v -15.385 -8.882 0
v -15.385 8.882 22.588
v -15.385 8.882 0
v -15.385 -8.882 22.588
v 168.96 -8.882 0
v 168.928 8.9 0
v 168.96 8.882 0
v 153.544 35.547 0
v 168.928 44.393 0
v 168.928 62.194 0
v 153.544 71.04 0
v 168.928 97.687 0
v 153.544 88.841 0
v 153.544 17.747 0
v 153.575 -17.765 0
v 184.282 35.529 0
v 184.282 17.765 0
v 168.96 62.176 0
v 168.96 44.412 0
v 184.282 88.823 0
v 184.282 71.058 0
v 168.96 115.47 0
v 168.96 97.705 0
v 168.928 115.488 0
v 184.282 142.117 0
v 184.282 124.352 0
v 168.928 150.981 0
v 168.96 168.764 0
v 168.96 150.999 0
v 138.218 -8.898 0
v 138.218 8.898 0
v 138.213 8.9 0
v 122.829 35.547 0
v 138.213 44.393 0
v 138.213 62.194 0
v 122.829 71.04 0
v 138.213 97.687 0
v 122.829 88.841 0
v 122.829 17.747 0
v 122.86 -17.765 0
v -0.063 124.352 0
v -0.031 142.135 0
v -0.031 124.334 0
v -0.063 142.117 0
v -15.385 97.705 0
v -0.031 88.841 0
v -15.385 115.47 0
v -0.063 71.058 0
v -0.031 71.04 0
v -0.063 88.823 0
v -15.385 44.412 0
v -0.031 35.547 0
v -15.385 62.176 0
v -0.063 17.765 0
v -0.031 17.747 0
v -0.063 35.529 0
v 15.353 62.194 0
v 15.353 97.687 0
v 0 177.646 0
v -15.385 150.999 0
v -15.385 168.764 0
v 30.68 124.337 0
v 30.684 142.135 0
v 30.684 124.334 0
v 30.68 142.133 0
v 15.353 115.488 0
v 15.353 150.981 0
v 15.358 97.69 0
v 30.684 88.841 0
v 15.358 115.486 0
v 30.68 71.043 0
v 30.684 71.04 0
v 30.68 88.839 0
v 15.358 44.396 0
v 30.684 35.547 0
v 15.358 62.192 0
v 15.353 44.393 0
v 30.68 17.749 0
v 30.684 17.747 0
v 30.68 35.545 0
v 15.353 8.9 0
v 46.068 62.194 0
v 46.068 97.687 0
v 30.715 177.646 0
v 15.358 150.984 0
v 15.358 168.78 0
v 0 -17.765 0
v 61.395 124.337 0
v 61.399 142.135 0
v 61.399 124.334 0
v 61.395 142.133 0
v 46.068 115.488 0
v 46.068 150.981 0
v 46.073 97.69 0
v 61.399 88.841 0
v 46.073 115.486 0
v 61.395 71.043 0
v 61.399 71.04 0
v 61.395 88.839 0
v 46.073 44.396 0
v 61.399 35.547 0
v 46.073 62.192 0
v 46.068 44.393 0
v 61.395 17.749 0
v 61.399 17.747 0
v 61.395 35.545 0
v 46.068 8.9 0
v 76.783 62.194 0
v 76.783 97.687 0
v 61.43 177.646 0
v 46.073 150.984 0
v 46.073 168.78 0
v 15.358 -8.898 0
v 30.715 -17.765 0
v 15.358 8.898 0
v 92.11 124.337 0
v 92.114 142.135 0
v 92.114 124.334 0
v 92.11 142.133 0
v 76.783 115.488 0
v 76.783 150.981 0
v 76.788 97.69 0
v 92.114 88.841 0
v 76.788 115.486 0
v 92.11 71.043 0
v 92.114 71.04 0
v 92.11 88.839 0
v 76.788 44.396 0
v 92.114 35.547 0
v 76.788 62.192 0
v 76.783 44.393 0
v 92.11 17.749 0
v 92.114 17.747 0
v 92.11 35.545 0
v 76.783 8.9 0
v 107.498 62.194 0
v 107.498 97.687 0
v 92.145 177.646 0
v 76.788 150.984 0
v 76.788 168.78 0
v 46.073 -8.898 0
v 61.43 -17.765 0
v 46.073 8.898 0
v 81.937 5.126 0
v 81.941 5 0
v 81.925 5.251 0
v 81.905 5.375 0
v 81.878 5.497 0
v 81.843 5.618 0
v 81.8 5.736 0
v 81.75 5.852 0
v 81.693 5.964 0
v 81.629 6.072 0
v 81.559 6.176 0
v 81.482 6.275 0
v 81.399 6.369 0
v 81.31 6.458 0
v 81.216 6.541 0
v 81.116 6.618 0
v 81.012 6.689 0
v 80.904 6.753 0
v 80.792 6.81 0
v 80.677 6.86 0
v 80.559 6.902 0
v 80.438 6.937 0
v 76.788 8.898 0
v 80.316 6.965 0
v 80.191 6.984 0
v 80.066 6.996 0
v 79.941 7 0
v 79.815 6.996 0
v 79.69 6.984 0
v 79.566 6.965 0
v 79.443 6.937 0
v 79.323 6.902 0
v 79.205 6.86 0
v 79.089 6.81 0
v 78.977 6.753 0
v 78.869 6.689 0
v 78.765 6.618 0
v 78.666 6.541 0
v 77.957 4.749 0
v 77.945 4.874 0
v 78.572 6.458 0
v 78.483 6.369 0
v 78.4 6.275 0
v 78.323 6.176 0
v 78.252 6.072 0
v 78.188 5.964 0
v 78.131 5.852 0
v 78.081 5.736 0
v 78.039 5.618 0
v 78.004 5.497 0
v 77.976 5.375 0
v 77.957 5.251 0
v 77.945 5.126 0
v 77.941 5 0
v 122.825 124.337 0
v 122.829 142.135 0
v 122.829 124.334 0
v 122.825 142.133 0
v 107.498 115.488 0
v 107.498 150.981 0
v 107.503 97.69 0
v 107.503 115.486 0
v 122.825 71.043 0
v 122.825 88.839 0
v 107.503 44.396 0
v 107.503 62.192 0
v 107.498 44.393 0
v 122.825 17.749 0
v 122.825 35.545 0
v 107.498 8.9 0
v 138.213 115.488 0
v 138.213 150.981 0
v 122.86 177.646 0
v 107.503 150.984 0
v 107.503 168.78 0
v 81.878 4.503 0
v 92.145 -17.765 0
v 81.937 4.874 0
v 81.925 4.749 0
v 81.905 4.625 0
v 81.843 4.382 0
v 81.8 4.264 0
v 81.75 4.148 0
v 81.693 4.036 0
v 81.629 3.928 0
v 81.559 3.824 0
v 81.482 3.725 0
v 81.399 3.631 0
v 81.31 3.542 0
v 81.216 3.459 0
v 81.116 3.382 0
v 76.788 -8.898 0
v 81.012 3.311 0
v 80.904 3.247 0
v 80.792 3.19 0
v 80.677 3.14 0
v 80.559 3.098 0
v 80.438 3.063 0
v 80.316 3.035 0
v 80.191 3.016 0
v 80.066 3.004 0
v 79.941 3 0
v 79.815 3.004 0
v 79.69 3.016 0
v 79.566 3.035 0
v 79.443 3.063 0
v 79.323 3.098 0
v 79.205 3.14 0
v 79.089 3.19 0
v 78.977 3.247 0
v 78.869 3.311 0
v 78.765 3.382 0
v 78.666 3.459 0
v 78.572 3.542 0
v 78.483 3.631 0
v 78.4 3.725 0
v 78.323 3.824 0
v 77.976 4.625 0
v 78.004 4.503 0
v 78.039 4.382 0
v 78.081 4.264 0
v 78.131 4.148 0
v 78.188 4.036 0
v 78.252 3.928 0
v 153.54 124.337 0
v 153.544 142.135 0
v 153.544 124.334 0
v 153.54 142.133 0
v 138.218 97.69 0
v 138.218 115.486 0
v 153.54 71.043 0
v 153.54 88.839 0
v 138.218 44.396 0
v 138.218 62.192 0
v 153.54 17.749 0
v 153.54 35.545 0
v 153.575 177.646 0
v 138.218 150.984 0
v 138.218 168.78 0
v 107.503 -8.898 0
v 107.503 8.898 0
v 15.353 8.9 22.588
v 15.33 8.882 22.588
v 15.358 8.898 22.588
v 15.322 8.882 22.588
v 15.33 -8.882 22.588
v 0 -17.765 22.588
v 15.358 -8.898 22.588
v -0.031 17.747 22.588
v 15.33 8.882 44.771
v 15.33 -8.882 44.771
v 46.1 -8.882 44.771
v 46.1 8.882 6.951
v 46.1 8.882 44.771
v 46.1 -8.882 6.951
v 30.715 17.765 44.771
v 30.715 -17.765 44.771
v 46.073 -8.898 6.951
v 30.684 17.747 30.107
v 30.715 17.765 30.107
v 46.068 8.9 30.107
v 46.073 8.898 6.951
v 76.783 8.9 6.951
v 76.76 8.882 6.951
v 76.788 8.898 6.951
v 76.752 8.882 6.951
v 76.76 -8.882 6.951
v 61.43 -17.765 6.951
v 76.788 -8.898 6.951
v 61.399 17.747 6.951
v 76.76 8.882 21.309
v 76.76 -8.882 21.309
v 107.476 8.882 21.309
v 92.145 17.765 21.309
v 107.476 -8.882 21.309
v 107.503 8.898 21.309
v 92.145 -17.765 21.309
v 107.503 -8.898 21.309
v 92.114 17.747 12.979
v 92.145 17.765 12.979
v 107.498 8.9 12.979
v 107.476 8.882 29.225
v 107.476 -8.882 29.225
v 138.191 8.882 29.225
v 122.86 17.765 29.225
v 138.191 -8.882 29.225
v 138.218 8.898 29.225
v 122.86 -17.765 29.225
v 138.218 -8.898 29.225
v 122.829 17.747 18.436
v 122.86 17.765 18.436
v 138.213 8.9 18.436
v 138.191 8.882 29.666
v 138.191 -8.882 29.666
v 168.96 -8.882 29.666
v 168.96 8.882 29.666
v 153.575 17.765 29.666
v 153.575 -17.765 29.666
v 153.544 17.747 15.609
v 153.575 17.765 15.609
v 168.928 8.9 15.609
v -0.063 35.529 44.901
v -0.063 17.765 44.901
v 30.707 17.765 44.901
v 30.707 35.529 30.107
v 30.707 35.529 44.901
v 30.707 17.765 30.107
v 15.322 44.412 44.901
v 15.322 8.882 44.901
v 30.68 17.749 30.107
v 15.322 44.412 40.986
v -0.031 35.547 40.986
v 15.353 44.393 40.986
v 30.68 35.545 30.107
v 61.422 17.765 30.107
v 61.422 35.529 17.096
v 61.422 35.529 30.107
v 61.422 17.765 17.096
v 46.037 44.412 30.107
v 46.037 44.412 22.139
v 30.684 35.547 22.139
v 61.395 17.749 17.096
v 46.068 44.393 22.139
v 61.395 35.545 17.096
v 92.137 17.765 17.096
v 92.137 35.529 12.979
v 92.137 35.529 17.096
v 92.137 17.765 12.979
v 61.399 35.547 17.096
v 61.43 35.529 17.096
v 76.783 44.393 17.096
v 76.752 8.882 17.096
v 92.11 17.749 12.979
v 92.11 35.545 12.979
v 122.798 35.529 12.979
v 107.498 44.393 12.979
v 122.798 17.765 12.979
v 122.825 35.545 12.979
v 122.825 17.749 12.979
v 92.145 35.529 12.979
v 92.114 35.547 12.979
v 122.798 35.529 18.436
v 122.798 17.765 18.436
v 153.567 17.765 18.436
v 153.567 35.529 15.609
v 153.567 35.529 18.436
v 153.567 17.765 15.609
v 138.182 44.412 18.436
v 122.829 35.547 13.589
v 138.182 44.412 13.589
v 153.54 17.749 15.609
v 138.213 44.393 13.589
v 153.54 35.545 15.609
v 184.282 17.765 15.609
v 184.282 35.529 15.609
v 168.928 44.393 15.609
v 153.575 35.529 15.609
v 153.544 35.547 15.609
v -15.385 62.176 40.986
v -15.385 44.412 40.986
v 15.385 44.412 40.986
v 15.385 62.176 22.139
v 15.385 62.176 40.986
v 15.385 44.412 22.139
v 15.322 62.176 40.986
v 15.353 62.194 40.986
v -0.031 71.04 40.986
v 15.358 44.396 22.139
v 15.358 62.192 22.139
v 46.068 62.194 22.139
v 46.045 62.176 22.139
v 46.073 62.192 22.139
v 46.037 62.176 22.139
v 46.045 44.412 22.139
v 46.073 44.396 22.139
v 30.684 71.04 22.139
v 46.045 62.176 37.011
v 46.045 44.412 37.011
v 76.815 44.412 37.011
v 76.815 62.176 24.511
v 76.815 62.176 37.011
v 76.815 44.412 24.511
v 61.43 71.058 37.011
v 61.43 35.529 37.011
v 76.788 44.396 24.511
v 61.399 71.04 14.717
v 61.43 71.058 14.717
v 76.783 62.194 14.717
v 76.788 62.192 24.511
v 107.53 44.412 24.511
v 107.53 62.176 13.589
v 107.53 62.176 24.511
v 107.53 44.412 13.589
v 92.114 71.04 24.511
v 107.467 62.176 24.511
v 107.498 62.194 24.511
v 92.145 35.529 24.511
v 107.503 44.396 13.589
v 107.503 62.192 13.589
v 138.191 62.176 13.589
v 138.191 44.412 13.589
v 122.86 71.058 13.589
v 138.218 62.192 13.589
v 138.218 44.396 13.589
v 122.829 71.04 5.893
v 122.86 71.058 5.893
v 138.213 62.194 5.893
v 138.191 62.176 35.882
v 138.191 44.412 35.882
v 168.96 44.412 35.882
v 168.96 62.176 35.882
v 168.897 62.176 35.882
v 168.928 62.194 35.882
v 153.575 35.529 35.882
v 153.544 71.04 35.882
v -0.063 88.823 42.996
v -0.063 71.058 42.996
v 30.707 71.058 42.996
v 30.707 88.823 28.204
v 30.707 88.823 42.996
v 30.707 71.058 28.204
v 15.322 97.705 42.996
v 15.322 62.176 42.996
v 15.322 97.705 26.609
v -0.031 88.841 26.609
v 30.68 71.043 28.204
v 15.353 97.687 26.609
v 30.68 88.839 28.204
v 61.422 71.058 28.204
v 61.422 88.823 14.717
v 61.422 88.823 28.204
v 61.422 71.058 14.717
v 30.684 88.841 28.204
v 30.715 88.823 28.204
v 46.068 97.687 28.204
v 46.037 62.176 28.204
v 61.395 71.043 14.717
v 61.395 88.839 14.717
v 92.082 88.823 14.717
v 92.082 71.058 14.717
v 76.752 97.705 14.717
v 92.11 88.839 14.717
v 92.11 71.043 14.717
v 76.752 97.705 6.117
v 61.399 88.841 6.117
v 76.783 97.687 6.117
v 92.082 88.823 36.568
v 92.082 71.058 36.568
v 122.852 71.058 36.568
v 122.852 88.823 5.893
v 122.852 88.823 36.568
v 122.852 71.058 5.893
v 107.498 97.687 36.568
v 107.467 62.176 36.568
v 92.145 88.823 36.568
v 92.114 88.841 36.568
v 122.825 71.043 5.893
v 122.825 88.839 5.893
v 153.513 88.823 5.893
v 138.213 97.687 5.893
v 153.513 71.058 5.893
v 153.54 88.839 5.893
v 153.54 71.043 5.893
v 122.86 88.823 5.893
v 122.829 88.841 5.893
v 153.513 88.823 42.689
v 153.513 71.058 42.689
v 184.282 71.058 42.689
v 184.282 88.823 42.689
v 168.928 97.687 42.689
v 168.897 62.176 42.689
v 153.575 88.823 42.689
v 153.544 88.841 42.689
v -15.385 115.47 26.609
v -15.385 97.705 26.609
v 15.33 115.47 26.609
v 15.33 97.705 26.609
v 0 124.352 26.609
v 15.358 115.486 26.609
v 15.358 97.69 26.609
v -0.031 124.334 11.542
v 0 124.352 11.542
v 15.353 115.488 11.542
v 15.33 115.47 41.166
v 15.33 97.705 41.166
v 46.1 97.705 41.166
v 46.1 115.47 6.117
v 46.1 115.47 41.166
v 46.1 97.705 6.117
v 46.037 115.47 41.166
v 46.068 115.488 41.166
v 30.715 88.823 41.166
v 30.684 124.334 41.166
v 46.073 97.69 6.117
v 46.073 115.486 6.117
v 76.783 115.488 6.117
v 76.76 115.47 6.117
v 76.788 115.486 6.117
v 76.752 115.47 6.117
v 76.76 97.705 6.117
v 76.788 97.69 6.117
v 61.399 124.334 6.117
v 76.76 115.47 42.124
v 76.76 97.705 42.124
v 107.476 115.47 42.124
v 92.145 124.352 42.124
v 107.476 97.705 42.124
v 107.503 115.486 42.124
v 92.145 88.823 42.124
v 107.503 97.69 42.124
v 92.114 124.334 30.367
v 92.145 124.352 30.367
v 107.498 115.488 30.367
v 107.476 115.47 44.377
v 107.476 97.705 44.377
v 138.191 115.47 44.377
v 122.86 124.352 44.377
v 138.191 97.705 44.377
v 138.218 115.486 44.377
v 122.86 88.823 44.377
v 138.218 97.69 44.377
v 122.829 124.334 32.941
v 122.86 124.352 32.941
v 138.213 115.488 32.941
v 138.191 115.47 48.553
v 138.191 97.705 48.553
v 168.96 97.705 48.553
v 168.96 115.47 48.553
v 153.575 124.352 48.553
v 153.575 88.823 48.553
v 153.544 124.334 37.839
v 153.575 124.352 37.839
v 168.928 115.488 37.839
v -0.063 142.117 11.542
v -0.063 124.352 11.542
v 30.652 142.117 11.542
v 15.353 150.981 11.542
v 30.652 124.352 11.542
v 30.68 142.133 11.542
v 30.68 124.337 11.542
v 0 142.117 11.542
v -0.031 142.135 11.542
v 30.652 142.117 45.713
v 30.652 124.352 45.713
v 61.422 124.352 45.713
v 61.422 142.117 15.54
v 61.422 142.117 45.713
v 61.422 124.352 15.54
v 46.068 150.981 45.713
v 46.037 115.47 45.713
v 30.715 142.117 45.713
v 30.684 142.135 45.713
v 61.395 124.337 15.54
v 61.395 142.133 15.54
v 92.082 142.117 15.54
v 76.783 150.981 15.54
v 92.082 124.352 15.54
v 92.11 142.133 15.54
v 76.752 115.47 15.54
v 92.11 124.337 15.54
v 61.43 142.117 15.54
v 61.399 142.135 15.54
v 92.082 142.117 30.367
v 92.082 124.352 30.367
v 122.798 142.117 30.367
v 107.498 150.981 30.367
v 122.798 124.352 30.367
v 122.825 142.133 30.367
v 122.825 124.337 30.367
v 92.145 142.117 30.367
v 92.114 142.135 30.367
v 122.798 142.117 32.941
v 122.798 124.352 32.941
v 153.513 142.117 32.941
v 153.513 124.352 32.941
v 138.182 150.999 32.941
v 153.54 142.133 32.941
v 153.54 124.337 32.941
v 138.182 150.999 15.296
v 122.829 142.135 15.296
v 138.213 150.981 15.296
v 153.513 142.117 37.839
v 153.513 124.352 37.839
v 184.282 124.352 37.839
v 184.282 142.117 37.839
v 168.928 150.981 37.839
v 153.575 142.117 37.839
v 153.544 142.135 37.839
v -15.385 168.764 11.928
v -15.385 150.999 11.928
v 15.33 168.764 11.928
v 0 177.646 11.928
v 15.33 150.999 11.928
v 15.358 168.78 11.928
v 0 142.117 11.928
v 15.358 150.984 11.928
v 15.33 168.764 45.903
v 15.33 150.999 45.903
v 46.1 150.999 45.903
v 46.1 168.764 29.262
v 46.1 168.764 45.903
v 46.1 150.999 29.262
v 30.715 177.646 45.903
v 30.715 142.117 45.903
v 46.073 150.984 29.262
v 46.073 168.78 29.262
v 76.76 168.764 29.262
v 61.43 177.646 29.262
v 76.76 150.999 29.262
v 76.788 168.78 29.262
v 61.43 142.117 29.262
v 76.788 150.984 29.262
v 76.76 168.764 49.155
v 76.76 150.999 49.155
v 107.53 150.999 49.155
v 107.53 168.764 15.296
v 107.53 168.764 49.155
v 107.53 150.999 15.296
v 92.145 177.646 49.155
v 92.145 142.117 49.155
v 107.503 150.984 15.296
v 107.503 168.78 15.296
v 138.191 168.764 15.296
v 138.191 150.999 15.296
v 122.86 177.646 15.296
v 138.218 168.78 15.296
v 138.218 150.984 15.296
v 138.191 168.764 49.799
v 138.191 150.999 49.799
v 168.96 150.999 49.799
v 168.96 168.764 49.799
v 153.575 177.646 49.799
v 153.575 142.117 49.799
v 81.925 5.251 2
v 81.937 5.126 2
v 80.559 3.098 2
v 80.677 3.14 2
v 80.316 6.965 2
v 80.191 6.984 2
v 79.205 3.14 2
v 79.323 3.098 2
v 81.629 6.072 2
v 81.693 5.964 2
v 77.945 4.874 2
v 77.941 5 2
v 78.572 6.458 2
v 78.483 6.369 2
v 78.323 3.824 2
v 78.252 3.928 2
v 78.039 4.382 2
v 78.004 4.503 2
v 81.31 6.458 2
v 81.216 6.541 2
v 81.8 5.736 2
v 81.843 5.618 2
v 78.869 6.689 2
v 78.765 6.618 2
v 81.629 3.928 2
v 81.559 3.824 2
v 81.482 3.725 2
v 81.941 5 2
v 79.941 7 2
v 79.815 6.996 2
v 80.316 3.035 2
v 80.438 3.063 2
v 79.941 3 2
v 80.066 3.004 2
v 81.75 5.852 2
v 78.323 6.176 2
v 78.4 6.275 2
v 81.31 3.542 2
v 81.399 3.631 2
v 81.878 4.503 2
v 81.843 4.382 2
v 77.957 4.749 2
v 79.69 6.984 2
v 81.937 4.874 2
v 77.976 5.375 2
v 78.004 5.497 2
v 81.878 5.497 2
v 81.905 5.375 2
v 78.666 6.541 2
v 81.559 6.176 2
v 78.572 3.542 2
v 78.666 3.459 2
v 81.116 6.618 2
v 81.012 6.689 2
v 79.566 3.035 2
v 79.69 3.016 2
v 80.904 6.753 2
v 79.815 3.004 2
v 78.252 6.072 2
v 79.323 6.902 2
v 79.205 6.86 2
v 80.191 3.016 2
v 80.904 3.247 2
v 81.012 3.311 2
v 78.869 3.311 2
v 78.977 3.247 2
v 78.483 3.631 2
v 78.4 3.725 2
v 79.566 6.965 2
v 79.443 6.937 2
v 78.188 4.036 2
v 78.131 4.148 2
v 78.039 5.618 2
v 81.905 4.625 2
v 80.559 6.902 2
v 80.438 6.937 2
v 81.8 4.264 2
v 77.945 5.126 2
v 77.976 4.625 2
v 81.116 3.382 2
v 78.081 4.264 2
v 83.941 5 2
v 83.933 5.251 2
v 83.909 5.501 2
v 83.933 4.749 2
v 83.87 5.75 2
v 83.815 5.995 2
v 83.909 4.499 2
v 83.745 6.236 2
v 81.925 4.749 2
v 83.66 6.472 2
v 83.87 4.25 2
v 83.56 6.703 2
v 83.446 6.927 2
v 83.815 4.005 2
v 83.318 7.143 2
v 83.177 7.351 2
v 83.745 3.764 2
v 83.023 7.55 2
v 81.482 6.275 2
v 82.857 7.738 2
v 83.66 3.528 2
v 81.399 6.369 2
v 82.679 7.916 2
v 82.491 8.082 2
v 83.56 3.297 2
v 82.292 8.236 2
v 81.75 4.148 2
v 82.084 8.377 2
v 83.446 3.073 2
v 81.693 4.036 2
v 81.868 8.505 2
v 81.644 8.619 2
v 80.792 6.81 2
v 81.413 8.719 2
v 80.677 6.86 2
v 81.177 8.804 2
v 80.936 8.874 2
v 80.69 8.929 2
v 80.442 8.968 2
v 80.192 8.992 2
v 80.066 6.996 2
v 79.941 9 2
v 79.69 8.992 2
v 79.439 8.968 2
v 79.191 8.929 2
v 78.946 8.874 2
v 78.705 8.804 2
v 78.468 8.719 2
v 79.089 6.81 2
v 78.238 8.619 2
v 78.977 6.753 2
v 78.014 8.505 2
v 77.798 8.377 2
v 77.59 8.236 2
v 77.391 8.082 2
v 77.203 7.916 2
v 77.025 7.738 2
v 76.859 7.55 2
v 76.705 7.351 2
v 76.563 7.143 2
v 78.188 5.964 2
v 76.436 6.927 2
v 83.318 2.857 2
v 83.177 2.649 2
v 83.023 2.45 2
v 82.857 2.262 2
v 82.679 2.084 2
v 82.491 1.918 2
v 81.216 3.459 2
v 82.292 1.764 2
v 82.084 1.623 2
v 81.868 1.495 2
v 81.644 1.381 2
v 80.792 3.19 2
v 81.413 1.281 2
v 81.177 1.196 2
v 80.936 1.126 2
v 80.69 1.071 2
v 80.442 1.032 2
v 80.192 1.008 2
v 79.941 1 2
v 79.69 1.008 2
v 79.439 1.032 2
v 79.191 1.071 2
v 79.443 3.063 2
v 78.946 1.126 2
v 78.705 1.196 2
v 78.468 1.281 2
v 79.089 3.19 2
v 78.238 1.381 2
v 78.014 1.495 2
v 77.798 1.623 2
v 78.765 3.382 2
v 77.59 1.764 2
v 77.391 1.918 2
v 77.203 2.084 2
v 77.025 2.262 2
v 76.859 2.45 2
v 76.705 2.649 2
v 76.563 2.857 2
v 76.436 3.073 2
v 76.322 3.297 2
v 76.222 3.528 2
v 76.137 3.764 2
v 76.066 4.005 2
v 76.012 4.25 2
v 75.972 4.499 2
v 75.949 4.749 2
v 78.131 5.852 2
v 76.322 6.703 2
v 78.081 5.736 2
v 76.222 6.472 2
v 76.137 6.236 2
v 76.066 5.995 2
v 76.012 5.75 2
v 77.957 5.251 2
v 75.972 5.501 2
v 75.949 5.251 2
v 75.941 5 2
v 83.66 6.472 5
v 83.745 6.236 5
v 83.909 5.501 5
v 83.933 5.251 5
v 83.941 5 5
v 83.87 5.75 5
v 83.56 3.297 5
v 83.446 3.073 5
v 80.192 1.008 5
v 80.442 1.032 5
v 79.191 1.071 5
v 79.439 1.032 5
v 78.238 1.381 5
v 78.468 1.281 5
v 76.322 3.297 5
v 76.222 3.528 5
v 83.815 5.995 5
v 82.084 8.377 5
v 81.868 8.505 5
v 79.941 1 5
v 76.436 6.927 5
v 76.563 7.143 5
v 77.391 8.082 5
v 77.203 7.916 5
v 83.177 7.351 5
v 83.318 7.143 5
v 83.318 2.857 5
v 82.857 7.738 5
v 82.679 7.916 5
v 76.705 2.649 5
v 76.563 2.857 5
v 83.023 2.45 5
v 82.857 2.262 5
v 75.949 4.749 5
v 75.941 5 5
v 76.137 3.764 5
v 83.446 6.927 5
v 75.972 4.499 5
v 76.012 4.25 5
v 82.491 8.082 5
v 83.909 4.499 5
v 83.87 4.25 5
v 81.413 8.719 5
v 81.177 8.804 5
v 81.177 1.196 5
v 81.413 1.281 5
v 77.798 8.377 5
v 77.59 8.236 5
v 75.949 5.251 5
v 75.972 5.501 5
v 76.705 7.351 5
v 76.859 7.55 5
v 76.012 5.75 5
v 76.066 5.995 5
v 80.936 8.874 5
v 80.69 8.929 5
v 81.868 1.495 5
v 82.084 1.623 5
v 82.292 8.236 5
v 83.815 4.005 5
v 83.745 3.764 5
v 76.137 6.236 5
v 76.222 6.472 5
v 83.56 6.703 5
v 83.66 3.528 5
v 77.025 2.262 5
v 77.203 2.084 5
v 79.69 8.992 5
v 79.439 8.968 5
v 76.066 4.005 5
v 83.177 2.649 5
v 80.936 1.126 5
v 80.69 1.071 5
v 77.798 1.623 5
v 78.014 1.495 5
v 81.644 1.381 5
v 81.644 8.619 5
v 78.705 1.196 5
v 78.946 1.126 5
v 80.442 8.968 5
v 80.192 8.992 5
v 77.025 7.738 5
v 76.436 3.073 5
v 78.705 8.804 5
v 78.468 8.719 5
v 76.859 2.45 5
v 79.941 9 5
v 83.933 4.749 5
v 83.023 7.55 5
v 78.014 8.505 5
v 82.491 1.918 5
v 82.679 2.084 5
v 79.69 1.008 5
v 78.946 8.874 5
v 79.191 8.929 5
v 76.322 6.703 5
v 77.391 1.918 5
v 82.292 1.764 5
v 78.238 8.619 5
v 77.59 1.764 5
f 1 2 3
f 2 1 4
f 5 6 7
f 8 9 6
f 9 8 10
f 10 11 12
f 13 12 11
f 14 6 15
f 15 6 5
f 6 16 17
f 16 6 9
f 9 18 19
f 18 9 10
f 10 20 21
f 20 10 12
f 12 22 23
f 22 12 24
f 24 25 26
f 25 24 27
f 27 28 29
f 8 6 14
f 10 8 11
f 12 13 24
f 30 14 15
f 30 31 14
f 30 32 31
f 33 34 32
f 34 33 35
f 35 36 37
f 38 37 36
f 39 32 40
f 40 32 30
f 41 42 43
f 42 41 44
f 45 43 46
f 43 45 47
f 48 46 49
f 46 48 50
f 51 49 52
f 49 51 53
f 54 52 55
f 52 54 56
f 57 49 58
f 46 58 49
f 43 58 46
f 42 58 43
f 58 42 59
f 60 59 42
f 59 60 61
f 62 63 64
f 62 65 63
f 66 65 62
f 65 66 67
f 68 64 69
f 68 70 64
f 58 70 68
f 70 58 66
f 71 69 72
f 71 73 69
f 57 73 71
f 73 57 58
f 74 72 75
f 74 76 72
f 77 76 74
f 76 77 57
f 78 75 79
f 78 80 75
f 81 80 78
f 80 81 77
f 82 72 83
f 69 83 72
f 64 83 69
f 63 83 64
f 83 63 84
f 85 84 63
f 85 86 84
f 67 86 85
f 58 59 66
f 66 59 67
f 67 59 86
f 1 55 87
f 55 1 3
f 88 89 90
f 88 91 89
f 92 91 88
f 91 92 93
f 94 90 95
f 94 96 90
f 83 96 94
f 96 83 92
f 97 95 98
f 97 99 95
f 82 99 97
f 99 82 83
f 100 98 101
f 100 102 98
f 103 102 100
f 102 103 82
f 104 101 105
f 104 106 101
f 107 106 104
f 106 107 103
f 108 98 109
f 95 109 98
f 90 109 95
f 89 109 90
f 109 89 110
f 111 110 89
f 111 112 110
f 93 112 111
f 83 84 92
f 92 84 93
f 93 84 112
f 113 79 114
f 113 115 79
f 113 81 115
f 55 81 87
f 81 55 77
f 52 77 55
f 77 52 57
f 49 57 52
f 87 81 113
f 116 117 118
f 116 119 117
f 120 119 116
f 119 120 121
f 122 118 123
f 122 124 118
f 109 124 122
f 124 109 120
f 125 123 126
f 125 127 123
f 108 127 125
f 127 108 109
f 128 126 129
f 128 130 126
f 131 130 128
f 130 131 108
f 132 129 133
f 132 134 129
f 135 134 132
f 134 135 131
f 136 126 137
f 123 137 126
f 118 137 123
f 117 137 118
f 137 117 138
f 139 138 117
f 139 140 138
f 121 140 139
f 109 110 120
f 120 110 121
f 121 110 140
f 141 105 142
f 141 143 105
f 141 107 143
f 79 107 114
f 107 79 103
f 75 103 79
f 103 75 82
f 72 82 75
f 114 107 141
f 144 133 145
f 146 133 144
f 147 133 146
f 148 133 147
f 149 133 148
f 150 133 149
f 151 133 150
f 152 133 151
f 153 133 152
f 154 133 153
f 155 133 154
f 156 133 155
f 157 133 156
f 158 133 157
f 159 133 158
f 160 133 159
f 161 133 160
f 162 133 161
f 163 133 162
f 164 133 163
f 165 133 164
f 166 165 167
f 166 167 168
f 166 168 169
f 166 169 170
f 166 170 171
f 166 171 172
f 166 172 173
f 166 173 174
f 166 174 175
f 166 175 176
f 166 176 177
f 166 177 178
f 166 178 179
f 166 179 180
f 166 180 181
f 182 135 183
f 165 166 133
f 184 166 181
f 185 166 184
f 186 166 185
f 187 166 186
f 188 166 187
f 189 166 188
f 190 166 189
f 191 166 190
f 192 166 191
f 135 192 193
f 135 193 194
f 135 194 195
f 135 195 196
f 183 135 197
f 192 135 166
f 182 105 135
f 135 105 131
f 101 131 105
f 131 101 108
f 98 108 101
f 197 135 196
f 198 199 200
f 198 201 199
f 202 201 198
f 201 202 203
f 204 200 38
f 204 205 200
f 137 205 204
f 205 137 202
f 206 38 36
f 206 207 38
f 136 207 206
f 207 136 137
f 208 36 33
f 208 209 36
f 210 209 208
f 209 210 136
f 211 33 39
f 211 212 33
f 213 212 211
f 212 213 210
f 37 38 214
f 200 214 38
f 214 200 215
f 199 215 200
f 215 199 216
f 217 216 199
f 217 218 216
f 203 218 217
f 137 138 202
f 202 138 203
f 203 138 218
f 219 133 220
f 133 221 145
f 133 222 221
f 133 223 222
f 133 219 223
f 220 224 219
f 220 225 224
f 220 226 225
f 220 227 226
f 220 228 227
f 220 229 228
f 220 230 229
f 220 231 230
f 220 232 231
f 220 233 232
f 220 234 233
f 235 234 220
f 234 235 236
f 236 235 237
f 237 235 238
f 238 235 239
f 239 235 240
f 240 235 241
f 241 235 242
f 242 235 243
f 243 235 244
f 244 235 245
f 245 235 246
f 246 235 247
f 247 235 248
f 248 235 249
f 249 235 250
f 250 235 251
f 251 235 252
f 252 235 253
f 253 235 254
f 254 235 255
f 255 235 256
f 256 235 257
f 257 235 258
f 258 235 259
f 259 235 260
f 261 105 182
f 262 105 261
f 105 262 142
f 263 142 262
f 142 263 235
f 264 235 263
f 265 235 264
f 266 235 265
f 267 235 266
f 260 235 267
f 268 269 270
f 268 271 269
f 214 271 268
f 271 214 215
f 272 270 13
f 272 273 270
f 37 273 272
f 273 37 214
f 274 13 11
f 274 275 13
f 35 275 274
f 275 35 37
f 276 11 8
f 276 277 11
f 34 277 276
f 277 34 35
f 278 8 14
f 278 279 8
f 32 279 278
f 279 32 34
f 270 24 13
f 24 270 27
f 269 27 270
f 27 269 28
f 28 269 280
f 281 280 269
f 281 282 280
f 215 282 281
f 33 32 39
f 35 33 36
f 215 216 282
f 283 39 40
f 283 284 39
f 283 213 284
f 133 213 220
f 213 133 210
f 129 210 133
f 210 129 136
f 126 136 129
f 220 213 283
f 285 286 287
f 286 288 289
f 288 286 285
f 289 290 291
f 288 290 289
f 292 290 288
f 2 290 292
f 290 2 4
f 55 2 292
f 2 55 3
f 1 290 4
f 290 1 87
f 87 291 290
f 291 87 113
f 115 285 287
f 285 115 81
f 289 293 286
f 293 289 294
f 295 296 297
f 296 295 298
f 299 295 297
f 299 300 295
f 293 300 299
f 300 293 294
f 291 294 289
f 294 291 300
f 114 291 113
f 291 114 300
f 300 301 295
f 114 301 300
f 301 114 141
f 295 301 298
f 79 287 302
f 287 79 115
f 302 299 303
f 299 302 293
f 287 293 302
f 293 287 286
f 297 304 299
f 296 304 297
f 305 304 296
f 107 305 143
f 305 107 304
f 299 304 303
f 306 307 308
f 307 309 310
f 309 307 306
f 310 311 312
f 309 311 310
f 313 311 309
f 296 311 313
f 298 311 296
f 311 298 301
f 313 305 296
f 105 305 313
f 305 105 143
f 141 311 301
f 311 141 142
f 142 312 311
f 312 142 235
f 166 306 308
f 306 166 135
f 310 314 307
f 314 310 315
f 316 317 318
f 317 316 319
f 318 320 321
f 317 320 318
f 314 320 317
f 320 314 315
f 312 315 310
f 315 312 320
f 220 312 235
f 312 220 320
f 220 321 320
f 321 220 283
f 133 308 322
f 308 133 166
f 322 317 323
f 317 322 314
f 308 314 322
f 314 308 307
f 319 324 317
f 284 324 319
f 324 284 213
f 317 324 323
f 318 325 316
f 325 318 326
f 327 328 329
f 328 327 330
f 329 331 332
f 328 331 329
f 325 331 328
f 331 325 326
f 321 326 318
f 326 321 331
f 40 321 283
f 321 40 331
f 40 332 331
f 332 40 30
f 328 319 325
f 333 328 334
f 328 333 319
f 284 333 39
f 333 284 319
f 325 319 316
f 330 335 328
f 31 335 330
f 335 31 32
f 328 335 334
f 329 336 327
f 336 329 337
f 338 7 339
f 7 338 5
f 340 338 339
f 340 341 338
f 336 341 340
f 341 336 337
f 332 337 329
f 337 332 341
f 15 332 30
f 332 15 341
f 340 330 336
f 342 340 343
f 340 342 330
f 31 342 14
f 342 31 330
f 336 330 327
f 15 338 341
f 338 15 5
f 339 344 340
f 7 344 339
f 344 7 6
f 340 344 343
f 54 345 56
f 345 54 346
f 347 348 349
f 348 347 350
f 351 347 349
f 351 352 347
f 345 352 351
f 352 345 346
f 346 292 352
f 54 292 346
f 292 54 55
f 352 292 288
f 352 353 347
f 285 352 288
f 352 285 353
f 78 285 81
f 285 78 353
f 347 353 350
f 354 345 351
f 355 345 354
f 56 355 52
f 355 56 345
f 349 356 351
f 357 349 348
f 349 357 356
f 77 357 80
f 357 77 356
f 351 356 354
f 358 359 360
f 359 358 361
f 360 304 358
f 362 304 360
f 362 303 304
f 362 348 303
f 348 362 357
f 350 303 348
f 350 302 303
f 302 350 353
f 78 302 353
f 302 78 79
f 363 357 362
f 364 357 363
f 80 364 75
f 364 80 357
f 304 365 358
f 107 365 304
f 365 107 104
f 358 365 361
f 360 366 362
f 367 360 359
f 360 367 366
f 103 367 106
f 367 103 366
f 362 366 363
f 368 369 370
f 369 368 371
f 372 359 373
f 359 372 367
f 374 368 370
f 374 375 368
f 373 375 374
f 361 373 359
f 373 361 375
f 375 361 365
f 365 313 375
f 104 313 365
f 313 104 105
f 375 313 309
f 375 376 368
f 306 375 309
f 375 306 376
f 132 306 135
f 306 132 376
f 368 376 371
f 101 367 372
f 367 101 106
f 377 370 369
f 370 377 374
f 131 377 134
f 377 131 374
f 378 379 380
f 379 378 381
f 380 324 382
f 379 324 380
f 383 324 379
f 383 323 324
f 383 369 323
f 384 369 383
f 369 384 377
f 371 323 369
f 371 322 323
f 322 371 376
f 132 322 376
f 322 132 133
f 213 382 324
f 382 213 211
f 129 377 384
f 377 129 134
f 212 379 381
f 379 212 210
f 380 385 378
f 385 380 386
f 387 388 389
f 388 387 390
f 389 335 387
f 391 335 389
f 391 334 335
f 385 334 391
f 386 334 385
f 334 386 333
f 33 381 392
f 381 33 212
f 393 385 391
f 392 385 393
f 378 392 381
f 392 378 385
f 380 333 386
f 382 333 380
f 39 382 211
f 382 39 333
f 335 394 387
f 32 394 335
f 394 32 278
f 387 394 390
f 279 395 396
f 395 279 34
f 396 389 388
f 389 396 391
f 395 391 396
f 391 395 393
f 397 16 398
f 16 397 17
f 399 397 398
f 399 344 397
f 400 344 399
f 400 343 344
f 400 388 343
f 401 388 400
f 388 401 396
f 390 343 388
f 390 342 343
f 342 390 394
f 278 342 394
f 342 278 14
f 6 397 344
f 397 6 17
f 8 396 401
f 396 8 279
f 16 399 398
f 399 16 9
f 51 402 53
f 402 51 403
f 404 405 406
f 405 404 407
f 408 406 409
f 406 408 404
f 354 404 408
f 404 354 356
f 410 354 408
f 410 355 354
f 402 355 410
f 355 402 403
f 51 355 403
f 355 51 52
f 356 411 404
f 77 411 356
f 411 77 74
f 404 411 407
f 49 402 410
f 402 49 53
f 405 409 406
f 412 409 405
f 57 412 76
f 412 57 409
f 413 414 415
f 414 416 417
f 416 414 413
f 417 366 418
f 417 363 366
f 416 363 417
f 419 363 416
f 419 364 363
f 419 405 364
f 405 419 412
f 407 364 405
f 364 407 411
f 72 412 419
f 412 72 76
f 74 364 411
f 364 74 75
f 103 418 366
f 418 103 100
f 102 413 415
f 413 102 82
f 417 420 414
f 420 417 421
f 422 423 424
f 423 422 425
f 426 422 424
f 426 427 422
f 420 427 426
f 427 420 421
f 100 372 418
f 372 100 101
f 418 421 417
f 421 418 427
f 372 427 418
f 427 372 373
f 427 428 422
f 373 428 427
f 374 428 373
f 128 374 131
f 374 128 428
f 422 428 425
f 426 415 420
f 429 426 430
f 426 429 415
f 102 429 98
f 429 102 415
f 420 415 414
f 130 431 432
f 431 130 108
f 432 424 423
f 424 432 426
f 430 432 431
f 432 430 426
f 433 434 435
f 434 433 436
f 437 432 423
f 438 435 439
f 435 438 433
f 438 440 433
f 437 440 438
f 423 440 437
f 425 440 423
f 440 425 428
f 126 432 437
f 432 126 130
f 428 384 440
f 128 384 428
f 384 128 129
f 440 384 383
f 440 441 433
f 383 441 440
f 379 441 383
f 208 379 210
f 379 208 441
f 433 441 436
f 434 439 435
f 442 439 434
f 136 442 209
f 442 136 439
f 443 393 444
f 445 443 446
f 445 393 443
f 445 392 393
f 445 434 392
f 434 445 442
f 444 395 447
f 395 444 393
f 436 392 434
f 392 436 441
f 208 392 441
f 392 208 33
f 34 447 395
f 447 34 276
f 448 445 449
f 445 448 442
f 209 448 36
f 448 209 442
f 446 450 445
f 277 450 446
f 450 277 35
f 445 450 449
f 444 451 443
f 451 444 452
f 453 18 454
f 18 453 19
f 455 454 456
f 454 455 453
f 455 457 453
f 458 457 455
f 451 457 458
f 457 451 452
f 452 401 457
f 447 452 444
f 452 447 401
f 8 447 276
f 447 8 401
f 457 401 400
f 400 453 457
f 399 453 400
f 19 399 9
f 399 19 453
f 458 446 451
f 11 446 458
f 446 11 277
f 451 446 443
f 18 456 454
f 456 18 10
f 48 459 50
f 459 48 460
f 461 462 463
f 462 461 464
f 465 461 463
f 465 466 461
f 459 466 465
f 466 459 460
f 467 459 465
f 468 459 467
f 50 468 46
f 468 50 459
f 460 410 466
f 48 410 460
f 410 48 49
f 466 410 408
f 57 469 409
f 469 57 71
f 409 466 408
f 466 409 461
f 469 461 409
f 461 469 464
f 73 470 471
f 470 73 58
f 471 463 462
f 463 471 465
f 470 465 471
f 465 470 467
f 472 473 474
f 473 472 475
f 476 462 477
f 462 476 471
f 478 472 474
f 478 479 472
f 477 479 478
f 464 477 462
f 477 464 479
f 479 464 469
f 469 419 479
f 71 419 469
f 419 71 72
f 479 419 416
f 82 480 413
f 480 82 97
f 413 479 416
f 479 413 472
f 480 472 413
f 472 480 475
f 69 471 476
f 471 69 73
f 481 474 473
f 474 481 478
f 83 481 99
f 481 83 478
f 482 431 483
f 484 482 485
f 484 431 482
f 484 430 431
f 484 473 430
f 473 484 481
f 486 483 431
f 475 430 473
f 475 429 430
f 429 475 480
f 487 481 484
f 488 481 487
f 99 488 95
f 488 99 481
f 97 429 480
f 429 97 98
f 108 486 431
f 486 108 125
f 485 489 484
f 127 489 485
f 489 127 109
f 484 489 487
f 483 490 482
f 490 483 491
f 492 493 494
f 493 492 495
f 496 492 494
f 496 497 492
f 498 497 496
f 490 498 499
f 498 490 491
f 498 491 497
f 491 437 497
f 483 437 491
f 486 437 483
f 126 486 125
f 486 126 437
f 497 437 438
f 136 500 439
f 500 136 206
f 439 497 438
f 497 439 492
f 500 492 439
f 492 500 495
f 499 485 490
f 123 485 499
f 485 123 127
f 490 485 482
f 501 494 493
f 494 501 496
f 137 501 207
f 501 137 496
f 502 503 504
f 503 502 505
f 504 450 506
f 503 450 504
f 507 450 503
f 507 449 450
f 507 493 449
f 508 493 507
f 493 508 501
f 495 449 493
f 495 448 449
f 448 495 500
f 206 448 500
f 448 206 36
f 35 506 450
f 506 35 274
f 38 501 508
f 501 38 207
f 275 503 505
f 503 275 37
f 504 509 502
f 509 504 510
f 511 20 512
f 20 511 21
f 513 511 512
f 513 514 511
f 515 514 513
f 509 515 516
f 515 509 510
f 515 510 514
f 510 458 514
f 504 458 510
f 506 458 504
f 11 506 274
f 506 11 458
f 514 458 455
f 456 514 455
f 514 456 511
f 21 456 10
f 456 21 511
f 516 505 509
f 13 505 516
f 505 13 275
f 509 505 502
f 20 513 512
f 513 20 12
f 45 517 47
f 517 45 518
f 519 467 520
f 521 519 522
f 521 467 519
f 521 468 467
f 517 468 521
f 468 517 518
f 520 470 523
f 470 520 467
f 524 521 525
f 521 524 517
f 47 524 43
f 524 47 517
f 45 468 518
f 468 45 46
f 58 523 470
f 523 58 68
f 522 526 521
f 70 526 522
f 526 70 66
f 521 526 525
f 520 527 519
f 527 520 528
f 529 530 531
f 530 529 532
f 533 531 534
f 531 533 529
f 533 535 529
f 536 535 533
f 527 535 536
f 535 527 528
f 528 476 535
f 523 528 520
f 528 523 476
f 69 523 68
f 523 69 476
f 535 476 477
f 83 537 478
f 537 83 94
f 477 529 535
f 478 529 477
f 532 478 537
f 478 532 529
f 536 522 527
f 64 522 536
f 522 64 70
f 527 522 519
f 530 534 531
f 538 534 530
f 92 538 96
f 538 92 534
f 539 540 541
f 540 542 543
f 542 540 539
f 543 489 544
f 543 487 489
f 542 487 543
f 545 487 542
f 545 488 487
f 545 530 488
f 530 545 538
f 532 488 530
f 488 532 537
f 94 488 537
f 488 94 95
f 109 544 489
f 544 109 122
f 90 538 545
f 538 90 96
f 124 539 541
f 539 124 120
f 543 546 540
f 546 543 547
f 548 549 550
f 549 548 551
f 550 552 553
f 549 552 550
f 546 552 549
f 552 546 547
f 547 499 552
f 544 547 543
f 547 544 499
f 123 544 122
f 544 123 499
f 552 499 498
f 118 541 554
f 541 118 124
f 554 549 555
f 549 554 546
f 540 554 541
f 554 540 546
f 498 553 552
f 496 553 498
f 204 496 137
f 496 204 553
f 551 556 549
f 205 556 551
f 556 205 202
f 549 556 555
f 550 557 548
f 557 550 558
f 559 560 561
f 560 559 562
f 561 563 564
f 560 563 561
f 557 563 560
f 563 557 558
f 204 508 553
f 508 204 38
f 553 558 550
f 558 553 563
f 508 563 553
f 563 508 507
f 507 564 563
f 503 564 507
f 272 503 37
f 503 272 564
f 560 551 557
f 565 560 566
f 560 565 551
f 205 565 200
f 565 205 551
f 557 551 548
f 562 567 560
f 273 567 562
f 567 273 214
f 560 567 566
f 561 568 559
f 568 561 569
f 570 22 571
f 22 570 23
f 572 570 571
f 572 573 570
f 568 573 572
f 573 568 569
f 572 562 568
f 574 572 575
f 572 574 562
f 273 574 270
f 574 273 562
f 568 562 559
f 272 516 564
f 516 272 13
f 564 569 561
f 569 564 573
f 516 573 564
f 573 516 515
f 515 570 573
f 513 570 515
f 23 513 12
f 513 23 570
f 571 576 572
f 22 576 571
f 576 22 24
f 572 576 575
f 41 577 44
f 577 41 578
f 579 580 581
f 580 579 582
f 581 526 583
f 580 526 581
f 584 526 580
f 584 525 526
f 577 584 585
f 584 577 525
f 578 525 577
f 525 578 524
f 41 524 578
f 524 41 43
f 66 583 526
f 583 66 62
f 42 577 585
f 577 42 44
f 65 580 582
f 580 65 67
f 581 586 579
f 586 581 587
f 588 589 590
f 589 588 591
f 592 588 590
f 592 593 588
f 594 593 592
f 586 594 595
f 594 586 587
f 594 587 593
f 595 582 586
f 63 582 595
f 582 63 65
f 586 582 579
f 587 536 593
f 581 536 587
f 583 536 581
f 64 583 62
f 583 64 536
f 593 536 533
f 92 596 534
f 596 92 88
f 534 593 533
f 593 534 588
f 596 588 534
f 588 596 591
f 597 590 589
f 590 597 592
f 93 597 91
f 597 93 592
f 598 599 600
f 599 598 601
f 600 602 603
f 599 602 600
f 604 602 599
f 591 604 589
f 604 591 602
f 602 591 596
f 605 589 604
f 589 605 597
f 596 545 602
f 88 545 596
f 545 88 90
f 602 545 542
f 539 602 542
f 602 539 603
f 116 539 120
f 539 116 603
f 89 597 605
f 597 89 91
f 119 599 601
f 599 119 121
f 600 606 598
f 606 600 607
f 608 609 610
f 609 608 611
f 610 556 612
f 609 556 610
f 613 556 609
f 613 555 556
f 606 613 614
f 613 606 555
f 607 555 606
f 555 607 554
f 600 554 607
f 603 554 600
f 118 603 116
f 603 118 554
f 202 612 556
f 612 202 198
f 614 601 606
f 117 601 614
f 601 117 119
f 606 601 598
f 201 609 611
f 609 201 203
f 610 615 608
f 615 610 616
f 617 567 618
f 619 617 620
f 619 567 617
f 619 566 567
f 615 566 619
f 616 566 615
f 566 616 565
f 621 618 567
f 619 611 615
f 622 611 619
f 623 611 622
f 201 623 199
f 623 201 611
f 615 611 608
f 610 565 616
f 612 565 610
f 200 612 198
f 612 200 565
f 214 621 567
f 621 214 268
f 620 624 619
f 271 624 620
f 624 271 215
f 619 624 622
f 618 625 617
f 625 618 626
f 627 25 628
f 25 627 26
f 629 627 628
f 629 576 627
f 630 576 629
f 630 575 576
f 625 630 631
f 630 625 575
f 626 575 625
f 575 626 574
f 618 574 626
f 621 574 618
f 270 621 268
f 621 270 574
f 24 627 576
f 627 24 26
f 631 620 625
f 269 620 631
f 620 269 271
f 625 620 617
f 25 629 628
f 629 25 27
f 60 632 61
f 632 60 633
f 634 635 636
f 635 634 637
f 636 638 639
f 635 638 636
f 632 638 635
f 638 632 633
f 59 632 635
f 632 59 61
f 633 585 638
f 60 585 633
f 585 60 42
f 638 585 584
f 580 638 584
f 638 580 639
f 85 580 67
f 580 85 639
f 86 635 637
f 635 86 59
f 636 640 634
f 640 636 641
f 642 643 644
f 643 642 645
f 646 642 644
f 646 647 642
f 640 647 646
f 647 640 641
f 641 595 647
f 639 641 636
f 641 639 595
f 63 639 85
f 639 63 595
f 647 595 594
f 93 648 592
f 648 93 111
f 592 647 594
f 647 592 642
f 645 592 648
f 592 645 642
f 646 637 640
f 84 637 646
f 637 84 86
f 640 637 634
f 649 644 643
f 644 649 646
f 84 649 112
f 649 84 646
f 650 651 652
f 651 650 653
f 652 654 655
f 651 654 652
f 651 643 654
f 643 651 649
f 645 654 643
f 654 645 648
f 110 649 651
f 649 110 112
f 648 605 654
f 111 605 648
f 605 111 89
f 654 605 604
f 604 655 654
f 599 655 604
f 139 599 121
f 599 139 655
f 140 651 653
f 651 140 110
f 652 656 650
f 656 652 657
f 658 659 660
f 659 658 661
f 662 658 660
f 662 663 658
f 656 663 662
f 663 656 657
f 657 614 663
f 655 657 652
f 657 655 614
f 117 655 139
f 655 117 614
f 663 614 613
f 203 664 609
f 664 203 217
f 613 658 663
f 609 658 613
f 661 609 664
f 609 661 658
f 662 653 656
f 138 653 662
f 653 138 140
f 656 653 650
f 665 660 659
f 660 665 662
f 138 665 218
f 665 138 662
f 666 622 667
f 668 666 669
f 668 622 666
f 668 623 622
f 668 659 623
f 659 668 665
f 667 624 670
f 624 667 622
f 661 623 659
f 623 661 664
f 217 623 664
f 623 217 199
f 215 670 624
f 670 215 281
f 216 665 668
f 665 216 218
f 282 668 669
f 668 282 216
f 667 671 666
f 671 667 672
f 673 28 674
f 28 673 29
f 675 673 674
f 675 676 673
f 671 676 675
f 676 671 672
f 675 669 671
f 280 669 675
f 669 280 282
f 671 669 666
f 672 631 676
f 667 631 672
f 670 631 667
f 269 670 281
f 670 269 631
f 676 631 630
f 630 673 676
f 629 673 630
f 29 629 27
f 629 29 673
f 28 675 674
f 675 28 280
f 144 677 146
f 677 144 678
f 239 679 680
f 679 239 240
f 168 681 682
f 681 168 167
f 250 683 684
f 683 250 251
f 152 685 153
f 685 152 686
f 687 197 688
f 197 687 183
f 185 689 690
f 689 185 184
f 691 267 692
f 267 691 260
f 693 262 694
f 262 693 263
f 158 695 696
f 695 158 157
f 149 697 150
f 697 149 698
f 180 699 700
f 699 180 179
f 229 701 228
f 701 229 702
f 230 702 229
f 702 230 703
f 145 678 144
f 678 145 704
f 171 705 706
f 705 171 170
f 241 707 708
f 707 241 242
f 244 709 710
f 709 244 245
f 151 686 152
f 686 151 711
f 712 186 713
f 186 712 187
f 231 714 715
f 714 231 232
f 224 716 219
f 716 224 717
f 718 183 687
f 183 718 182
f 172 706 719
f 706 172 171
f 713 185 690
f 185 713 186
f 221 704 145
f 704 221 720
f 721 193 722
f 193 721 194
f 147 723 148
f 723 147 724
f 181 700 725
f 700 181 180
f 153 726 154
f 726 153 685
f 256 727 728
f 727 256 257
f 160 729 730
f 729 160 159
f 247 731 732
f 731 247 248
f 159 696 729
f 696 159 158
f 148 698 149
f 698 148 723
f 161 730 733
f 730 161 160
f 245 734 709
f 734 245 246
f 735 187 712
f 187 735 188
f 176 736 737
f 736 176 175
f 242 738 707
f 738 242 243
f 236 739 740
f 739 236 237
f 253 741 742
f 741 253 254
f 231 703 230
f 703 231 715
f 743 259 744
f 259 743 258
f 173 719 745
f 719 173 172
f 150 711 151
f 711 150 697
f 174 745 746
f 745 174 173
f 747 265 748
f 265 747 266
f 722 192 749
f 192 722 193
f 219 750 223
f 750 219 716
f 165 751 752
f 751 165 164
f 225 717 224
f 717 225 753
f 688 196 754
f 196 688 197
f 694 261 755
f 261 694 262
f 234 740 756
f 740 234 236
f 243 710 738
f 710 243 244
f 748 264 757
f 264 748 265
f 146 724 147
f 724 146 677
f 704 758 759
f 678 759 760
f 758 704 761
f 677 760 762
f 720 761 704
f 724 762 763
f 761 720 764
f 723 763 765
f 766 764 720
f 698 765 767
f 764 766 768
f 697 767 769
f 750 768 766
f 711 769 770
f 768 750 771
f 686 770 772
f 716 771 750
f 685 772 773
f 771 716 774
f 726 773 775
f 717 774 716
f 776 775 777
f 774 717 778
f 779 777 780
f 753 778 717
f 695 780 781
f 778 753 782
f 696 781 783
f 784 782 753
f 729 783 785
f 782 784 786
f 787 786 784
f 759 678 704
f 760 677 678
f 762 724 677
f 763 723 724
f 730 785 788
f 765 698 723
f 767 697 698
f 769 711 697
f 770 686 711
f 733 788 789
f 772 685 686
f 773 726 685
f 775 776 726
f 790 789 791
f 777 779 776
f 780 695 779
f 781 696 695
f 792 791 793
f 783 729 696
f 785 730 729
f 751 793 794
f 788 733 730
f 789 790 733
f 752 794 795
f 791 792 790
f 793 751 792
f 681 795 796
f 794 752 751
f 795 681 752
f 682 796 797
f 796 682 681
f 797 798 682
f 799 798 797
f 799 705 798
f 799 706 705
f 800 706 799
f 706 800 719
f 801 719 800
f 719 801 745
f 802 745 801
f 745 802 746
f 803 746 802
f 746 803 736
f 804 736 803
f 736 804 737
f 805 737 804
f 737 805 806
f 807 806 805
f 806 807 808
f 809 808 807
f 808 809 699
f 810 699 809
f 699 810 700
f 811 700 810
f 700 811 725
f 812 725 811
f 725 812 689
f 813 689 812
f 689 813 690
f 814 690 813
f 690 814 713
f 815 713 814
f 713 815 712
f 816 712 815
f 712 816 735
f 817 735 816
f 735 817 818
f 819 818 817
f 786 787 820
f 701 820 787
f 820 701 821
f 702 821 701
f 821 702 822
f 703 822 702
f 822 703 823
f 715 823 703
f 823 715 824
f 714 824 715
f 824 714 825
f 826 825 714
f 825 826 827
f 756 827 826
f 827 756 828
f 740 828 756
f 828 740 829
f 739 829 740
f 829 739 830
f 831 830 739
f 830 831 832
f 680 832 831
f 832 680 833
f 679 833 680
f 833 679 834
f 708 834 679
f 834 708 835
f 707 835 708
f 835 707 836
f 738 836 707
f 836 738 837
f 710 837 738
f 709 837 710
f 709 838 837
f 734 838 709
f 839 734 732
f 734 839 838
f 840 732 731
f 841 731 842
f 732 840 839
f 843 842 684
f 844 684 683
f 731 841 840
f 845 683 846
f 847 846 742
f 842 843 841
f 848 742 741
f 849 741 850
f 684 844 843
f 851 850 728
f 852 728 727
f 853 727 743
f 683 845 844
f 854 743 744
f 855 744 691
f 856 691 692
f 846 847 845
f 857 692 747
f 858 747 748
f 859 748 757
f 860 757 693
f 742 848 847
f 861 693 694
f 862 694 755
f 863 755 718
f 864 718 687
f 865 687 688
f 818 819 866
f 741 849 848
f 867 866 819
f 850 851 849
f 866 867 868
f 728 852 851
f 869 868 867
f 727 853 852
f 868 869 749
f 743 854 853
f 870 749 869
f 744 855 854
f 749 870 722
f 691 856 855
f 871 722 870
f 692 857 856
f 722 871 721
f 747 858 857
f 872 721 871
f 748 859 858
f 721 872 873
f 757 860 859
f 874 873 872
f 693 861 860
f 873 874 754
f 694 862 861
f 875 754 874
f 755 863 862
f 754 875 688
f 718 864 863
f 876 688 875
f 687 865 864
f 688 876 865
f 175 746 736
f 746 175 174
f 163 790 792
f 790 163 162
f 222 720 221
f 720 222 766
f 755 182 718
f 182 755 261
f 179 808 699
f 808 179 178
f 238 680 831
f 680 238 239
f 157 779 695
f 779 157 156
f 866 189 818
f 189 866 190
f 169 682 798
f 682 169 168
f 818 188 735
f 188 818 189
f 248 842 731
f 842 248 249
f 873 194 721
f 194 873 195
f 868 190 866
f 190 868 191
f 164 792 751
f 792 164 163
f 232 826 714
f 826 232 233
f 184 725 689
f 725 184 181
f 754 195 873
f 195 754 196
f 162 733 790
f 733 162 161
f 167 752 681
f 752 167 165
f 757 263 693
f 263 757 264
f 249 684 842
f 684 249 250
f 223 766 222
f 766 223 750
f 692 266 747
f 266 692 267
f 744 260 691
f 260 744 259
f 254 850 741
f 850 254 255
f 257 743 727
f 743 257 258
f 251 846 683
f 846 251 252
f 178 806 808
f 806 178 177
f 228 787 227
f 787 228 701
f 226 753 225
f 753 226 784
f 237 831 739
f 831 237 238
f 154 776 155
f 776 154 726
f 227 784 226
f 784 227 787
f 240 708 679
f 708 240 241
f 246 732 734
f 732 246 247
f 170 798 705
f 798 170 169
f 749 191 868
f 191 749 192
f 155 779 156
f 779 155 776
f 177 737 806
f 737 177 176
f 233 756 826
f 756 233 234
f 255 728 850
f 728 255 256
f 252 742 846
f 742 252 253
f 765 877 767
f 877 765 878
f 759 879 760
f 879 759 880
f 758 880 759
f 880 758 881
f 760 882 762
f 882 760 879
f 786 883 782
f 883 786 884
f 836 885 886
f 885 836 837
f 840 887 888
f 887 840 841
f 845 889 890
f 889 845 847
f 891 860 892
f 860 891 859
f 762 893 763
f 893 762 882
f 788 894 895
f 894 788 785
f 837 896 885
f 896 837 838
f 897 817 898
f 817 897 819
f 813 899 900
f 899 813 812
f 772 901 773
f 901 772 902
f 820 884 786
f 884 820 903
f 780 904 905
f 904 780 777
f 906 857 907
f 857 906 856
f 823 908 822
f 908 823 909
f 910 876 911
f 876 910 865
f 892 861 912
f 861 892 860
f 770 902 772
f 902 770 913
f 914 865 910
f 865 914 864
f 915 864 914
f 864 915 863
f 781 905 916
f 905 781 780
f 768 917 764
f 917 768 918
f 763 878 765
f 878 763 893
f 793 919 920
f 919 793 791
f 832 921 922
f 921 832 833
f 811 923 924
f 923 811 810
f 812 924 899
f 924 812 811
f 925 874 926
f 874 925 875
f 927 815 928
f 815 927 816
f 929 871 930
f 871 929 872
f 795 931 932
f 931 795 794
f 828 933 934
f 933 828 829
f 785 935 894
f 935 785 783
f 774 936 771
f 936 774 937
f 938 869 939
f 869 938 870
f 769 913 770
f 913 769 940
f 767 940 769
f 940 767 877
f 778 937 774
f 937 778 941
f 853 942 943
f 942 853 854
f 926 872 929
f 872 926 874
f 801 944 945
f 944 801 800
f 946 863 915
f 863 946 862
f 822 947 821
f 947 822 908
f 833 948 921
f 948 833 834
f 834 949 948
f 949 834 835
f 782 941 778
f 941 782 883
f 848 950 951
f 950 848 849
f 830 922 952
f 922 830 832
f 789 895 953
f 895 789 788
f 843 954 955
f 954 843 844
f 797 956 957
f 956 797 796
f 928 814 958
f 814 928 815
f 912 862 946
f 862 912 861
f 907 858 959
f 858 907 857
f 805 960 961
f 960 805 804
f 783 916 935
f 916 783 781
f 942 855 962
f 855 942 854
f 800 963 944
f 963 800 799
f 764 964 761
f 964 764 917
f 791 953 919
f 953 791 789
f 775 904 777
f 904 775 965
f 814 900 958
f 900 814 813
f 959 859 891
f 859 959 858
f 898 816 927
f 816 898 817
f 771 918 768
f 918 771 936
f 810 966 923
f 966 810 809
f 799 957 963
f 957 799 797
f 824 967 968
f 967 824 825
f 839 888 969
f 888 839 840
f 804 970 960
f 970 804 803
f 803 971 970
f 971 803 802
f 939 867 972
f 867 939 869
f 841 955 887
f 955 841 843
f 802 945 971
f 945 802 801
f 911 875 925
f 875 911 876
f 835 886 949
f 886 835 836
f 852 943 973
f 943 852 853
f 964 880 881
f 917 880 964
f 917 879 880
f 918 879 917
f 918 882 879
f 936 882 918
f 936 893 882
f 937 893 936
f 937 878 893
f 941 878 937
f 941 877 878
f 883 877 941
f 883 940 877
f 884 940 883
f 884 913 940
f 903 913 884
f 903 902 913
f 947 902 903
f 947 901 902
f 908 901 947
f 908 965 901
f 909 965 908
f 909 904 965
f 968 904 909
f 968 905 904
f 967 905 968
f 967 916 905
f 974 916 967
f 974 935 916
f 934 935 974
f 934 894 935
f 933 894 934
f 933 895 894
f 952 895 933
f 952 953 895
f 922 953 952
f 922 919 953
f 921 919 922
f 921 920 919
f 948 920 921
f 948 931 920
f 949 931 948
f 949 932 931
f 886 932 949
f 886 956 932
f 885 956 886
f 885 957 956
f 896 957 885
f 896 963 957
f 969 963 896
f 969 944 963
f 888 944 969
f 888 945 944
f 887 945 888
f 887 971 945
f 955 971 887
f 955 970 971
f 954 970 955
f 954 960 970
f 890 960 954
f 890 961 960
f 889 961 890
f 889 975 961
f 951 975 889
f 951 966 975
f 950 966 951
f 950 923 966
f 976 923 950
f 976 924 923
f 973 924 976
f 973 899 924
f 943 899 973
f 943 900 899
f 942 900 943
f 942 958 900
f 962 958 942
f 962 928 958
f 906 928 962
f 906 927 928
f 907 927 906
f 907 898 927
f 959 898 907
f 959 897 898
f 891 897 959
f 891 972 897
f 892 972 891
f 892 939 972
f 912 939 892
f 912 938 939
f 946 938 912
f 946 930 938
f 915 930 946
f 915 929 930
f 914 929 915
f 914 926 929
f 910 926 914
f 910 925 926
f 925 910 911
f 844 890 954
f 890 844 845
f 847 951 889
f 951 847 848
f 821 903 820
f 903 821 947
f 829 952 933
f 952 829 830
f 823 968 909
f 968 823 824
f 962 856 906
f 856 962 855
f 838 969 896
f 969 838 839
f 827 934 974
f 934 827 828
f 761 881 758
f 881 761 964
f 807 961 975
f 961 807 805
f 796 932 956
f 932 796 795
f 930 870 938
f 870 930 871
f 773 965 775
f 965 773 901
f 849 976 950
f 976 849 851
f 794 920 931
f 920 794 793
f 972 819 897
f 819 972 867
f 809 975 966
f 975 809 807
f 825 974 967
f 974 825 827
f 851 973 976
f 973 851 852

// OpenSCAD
// Number of parts
num_parts = 42;
// Number of columns
max_columns = 6;
// Min Hexagon Height
heightMin = 5;
// Max Hexagon Height
heightMax = 50;
// Hexagon Grid Max Width
hexWmax = 200;
// Mounting hole - Creates a hole at the back in the middle with a bigger hole inside to hang on a nail
hole = true;
// Hole Diameter
holeD = 4;
/* [Advanced] */
// Resolution - Bigger the number, the longer it takes to render
resolution = 100;
// Part to show - Use this to only show that specific part, useful for exporting, see batch export script, leave as 0 to show all
part = 0;
/* [Hidden] */
// Default Viewport/camera settings - comment out to stop Viewport/camera moving or edit them to your liking, current viewport settings can be seen at bottom left
//$vpt = [150.51, 3.33, 102.94];
//$vpr = [55.70, 0, 20.80];
//$vpd = 755.18;
//$vpf = 22.50;

$fn = resolution;
hexW3 = (hexWmax / (max_columns + .5)) / 0.8660254;
hexW = hexW3;
radius = hexW / 2; 
X = radius*1.729; 
Y = radius*1.5; 

difference(){
for(i=[0:num_parts-1]) { 
    if(part == i + 1 || part == 0){
        column = i % max_columns; 
        row = floor(i / max_columns);
        colP = (row % 2 != 0) ? (radius/2)*1.725:0;
        translate ([column*X + colP, row*Y, 0]) {
            rvect=rands(0,1,3);
            color([rvect[0],rvect[1],rvect[2]])// Random Color
            hex();
        }
    }
}
if(hole){
    translate([max_columns*(radius*0.75), 5, 0]){ // Hole
        cylinder(d=holeD, h=2);
        translate([0, 0, 2])
            cylinder(d=holeD*2, h=3);
    }
}
}

module hex() {  
    height = rands(heightMin,heightMax,1)[0];
    radius = radius - 2;
    rotate([0,0,30]) // Base
        translate([0, 0, 0])
            linear_extrude(height)
                circle(r=radius + 2,$fn=6);
}
